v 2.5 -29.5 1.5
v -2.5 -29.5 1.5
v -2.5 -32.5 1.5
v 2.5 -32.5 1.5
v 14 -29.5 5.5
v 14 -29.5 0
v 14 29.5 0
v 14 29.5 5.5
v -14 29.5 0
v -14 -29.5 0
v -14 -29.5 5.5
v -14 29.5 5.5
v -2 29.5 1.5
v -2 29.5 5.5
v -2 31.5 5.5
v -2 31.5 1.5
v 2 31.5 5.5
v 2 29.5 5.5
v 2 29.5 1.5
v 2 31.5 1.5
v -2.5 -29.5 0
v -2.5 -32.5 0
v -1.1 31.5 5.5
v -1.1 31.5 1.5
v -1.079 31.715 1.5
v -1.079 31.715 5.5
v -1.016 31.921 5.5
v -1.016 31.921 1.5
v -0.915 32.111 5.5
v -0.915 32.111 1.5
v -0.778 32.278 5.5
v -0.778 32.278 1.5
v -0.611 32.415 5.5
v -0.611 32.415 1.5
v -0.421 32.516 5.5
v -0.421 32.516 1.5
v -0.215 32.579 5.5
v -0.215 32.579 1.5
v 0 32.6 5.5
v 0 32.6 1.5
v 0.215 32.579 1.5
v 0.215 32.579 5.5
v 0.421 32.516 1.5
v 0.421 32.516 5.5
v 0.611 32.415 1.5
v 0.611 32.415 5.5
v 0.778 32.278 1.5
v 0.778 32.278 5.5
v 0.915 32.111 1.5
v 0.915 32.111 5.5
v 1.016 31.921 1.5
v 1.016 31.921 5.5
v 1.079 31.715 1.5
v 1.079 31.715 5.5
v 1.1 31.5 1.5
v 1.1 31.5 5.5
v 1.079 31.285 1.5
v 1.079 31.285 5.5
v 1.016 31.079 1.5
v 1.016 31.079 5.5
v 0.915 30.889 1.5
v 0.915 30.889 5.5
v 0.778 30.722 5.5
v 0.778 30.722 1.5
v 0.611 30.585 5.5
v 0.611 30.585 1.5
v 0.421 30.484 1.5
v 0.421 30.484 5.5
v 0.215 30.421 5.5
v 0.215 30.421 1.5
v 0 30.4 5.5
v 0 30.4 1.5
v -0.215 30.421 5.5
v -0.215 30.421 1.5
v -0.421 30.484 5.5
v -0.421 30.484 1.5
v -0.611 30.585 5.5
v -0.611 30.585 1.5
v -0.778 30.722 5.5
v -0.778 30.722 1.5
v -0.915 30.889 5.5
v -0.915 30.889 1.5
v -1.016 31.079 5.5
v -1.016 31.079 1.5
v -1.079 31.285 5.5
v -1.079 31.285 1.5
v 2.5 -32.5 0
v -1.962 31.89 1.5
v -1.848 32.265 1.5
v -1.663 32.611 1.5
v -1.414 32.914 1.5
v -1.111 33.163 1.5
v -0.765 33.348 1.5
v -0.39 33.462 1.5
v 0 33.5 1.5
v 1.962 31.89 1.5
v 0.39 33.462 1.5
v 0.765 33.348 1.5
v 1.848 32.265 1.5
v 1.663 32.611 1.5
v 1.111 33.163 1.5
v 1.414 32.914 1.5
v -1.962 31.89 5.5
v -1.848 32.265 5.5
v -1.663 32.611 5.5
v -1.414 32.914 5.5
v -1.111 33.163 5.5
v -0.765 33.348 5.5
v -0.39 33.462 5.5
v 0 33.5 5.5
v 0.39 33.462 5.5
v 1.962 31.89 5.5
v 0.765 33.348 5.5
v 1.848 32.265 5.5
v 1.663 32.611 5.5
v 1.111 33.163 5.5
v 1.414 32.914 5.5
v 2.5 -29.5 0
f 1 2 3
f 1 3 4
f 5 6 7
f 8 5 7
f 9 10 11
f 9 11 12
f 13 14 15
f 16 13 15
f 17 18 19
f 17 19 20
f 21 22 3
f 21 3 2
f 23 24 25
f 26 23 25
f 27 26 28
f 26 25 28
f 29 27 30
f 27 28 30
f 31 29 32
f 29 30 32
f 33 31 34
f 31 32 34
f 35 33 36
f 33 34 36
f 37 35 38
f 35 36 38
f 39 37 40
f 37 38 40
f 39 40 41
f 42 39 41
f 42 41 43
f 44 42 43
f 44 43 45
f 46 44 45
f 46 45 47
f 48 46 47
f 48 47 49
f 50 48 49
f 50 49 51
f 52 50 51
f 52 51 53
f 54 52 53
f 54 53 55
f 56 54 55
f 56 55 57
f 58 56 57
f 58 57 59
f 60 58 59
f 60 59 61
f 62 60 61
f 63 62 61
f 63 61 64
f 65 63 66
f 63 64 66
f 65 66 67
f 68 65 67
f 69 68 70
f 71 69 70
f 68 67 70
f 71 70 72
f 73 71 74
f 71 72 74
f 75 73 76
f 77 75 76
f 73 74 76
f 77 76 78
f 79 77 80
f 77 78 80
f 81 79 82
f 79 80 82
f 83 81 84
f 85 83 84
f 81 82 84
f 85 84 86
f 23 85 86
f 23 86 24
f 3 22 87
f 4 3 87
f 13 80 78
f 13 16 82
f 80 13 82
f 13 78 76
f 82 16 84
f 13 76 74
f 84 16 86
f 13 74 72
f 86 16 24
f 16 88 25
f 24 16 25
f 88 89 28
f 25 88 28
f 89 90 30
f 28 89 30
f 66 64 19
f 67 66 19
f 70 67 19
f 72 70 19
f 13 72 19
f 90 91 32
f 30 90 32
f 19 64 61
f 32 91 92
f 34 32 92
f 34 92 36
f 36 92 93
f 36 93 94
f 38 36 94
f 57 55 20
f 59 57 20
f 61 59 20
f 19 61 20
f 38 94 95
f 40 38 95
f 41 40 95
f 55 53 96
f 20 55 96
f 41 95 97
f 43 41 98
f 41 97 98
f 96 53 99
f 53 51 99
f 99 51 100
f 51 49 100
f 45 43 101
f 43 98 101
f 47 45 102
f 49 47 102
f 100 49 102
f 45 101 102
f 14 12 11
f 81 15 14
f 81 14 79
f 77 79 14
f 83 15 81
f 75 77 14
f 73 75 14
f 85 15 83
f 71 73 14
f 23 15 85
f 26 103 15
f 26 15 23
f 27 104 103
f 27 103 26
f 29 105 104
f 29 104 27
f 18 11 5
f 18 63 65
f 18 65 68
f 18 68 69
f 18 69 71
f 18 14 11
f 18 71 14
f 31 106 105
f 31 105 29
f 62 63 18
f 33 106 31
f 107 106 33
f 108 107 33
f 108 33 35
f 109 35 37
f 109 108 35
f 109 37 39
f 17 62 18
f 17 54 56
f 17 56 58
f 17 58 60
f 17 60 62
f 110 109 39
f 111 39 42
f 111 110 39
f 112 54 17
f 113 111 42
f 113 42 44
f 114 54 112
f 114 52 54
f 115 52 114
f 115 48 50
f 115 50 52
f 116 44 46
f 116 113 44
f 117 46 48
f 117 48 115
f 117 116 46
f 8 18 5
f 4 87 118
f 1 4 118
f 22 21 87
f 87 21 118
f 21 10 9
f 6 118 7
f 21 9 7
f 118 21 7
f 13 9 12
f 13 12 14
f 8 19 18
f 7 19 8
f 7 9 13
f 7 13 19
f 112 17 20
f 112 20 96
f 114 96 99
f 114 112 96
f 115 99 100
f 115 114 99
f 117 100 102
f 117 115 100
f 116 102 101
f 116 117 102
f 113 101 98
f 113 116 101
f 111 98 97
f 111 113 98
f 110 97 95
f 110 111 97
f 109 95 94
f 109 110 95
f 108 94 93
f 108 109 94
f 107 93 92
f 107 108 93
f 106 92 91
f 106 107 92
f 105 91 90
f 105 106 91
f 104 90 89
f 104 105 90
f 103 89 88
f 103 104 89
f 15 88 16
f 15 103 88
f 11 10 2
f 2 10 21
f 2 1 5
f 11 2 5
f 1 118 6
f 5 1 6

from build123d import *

# Parameters (mm, degrees)
F0_W     = 28
F0_H     = 59
F1_DEPTH = 5.5
F2_W     = 5
F2_H     = 3
F3_DEPTH = 1.5
F4_W     = 4
F4_H     = 2
F5_DEPTH = 4
F6_D     = 2.2
F6_DEPTH = 5


with BuildPart() as f1:
    # F0 (on Top) → F1 (new body)
    with BuildSketch(Plane.XY):
        Rectangle(F0_W, F0_H)
    extrude(amount=F1_DEPTH)

    # F2 (on Top) → F3 (join)
    with BuildSketch(Plane.XY):
        with Locations((0, -31)):
            Rectangle(F2_W, F2_H)
    extrude(amount=F3_DEPTH)

    # F4 (on face) → F5 (join)
    with BuildSketch(Plane.XY.offset(5.5)):
        with Locations((0, 30.5)):
            Rectangle(F4_W, F4_H)
        with BuildLine():
            ThreePointArc((2, 31.5), (0, 33.5), (-2, 31.5))
            Line((-2, 31.5), (2, 31.5))
        make_face()
    extrude(amount=-F5_DEPTH)

    # F6
    with Locations(Plane.XY.offset(5.5)):
        with Locations((0, 31.5)):
            Hole(F6_D / 2, depth=F6_DEPTH)


solid = f1.part
